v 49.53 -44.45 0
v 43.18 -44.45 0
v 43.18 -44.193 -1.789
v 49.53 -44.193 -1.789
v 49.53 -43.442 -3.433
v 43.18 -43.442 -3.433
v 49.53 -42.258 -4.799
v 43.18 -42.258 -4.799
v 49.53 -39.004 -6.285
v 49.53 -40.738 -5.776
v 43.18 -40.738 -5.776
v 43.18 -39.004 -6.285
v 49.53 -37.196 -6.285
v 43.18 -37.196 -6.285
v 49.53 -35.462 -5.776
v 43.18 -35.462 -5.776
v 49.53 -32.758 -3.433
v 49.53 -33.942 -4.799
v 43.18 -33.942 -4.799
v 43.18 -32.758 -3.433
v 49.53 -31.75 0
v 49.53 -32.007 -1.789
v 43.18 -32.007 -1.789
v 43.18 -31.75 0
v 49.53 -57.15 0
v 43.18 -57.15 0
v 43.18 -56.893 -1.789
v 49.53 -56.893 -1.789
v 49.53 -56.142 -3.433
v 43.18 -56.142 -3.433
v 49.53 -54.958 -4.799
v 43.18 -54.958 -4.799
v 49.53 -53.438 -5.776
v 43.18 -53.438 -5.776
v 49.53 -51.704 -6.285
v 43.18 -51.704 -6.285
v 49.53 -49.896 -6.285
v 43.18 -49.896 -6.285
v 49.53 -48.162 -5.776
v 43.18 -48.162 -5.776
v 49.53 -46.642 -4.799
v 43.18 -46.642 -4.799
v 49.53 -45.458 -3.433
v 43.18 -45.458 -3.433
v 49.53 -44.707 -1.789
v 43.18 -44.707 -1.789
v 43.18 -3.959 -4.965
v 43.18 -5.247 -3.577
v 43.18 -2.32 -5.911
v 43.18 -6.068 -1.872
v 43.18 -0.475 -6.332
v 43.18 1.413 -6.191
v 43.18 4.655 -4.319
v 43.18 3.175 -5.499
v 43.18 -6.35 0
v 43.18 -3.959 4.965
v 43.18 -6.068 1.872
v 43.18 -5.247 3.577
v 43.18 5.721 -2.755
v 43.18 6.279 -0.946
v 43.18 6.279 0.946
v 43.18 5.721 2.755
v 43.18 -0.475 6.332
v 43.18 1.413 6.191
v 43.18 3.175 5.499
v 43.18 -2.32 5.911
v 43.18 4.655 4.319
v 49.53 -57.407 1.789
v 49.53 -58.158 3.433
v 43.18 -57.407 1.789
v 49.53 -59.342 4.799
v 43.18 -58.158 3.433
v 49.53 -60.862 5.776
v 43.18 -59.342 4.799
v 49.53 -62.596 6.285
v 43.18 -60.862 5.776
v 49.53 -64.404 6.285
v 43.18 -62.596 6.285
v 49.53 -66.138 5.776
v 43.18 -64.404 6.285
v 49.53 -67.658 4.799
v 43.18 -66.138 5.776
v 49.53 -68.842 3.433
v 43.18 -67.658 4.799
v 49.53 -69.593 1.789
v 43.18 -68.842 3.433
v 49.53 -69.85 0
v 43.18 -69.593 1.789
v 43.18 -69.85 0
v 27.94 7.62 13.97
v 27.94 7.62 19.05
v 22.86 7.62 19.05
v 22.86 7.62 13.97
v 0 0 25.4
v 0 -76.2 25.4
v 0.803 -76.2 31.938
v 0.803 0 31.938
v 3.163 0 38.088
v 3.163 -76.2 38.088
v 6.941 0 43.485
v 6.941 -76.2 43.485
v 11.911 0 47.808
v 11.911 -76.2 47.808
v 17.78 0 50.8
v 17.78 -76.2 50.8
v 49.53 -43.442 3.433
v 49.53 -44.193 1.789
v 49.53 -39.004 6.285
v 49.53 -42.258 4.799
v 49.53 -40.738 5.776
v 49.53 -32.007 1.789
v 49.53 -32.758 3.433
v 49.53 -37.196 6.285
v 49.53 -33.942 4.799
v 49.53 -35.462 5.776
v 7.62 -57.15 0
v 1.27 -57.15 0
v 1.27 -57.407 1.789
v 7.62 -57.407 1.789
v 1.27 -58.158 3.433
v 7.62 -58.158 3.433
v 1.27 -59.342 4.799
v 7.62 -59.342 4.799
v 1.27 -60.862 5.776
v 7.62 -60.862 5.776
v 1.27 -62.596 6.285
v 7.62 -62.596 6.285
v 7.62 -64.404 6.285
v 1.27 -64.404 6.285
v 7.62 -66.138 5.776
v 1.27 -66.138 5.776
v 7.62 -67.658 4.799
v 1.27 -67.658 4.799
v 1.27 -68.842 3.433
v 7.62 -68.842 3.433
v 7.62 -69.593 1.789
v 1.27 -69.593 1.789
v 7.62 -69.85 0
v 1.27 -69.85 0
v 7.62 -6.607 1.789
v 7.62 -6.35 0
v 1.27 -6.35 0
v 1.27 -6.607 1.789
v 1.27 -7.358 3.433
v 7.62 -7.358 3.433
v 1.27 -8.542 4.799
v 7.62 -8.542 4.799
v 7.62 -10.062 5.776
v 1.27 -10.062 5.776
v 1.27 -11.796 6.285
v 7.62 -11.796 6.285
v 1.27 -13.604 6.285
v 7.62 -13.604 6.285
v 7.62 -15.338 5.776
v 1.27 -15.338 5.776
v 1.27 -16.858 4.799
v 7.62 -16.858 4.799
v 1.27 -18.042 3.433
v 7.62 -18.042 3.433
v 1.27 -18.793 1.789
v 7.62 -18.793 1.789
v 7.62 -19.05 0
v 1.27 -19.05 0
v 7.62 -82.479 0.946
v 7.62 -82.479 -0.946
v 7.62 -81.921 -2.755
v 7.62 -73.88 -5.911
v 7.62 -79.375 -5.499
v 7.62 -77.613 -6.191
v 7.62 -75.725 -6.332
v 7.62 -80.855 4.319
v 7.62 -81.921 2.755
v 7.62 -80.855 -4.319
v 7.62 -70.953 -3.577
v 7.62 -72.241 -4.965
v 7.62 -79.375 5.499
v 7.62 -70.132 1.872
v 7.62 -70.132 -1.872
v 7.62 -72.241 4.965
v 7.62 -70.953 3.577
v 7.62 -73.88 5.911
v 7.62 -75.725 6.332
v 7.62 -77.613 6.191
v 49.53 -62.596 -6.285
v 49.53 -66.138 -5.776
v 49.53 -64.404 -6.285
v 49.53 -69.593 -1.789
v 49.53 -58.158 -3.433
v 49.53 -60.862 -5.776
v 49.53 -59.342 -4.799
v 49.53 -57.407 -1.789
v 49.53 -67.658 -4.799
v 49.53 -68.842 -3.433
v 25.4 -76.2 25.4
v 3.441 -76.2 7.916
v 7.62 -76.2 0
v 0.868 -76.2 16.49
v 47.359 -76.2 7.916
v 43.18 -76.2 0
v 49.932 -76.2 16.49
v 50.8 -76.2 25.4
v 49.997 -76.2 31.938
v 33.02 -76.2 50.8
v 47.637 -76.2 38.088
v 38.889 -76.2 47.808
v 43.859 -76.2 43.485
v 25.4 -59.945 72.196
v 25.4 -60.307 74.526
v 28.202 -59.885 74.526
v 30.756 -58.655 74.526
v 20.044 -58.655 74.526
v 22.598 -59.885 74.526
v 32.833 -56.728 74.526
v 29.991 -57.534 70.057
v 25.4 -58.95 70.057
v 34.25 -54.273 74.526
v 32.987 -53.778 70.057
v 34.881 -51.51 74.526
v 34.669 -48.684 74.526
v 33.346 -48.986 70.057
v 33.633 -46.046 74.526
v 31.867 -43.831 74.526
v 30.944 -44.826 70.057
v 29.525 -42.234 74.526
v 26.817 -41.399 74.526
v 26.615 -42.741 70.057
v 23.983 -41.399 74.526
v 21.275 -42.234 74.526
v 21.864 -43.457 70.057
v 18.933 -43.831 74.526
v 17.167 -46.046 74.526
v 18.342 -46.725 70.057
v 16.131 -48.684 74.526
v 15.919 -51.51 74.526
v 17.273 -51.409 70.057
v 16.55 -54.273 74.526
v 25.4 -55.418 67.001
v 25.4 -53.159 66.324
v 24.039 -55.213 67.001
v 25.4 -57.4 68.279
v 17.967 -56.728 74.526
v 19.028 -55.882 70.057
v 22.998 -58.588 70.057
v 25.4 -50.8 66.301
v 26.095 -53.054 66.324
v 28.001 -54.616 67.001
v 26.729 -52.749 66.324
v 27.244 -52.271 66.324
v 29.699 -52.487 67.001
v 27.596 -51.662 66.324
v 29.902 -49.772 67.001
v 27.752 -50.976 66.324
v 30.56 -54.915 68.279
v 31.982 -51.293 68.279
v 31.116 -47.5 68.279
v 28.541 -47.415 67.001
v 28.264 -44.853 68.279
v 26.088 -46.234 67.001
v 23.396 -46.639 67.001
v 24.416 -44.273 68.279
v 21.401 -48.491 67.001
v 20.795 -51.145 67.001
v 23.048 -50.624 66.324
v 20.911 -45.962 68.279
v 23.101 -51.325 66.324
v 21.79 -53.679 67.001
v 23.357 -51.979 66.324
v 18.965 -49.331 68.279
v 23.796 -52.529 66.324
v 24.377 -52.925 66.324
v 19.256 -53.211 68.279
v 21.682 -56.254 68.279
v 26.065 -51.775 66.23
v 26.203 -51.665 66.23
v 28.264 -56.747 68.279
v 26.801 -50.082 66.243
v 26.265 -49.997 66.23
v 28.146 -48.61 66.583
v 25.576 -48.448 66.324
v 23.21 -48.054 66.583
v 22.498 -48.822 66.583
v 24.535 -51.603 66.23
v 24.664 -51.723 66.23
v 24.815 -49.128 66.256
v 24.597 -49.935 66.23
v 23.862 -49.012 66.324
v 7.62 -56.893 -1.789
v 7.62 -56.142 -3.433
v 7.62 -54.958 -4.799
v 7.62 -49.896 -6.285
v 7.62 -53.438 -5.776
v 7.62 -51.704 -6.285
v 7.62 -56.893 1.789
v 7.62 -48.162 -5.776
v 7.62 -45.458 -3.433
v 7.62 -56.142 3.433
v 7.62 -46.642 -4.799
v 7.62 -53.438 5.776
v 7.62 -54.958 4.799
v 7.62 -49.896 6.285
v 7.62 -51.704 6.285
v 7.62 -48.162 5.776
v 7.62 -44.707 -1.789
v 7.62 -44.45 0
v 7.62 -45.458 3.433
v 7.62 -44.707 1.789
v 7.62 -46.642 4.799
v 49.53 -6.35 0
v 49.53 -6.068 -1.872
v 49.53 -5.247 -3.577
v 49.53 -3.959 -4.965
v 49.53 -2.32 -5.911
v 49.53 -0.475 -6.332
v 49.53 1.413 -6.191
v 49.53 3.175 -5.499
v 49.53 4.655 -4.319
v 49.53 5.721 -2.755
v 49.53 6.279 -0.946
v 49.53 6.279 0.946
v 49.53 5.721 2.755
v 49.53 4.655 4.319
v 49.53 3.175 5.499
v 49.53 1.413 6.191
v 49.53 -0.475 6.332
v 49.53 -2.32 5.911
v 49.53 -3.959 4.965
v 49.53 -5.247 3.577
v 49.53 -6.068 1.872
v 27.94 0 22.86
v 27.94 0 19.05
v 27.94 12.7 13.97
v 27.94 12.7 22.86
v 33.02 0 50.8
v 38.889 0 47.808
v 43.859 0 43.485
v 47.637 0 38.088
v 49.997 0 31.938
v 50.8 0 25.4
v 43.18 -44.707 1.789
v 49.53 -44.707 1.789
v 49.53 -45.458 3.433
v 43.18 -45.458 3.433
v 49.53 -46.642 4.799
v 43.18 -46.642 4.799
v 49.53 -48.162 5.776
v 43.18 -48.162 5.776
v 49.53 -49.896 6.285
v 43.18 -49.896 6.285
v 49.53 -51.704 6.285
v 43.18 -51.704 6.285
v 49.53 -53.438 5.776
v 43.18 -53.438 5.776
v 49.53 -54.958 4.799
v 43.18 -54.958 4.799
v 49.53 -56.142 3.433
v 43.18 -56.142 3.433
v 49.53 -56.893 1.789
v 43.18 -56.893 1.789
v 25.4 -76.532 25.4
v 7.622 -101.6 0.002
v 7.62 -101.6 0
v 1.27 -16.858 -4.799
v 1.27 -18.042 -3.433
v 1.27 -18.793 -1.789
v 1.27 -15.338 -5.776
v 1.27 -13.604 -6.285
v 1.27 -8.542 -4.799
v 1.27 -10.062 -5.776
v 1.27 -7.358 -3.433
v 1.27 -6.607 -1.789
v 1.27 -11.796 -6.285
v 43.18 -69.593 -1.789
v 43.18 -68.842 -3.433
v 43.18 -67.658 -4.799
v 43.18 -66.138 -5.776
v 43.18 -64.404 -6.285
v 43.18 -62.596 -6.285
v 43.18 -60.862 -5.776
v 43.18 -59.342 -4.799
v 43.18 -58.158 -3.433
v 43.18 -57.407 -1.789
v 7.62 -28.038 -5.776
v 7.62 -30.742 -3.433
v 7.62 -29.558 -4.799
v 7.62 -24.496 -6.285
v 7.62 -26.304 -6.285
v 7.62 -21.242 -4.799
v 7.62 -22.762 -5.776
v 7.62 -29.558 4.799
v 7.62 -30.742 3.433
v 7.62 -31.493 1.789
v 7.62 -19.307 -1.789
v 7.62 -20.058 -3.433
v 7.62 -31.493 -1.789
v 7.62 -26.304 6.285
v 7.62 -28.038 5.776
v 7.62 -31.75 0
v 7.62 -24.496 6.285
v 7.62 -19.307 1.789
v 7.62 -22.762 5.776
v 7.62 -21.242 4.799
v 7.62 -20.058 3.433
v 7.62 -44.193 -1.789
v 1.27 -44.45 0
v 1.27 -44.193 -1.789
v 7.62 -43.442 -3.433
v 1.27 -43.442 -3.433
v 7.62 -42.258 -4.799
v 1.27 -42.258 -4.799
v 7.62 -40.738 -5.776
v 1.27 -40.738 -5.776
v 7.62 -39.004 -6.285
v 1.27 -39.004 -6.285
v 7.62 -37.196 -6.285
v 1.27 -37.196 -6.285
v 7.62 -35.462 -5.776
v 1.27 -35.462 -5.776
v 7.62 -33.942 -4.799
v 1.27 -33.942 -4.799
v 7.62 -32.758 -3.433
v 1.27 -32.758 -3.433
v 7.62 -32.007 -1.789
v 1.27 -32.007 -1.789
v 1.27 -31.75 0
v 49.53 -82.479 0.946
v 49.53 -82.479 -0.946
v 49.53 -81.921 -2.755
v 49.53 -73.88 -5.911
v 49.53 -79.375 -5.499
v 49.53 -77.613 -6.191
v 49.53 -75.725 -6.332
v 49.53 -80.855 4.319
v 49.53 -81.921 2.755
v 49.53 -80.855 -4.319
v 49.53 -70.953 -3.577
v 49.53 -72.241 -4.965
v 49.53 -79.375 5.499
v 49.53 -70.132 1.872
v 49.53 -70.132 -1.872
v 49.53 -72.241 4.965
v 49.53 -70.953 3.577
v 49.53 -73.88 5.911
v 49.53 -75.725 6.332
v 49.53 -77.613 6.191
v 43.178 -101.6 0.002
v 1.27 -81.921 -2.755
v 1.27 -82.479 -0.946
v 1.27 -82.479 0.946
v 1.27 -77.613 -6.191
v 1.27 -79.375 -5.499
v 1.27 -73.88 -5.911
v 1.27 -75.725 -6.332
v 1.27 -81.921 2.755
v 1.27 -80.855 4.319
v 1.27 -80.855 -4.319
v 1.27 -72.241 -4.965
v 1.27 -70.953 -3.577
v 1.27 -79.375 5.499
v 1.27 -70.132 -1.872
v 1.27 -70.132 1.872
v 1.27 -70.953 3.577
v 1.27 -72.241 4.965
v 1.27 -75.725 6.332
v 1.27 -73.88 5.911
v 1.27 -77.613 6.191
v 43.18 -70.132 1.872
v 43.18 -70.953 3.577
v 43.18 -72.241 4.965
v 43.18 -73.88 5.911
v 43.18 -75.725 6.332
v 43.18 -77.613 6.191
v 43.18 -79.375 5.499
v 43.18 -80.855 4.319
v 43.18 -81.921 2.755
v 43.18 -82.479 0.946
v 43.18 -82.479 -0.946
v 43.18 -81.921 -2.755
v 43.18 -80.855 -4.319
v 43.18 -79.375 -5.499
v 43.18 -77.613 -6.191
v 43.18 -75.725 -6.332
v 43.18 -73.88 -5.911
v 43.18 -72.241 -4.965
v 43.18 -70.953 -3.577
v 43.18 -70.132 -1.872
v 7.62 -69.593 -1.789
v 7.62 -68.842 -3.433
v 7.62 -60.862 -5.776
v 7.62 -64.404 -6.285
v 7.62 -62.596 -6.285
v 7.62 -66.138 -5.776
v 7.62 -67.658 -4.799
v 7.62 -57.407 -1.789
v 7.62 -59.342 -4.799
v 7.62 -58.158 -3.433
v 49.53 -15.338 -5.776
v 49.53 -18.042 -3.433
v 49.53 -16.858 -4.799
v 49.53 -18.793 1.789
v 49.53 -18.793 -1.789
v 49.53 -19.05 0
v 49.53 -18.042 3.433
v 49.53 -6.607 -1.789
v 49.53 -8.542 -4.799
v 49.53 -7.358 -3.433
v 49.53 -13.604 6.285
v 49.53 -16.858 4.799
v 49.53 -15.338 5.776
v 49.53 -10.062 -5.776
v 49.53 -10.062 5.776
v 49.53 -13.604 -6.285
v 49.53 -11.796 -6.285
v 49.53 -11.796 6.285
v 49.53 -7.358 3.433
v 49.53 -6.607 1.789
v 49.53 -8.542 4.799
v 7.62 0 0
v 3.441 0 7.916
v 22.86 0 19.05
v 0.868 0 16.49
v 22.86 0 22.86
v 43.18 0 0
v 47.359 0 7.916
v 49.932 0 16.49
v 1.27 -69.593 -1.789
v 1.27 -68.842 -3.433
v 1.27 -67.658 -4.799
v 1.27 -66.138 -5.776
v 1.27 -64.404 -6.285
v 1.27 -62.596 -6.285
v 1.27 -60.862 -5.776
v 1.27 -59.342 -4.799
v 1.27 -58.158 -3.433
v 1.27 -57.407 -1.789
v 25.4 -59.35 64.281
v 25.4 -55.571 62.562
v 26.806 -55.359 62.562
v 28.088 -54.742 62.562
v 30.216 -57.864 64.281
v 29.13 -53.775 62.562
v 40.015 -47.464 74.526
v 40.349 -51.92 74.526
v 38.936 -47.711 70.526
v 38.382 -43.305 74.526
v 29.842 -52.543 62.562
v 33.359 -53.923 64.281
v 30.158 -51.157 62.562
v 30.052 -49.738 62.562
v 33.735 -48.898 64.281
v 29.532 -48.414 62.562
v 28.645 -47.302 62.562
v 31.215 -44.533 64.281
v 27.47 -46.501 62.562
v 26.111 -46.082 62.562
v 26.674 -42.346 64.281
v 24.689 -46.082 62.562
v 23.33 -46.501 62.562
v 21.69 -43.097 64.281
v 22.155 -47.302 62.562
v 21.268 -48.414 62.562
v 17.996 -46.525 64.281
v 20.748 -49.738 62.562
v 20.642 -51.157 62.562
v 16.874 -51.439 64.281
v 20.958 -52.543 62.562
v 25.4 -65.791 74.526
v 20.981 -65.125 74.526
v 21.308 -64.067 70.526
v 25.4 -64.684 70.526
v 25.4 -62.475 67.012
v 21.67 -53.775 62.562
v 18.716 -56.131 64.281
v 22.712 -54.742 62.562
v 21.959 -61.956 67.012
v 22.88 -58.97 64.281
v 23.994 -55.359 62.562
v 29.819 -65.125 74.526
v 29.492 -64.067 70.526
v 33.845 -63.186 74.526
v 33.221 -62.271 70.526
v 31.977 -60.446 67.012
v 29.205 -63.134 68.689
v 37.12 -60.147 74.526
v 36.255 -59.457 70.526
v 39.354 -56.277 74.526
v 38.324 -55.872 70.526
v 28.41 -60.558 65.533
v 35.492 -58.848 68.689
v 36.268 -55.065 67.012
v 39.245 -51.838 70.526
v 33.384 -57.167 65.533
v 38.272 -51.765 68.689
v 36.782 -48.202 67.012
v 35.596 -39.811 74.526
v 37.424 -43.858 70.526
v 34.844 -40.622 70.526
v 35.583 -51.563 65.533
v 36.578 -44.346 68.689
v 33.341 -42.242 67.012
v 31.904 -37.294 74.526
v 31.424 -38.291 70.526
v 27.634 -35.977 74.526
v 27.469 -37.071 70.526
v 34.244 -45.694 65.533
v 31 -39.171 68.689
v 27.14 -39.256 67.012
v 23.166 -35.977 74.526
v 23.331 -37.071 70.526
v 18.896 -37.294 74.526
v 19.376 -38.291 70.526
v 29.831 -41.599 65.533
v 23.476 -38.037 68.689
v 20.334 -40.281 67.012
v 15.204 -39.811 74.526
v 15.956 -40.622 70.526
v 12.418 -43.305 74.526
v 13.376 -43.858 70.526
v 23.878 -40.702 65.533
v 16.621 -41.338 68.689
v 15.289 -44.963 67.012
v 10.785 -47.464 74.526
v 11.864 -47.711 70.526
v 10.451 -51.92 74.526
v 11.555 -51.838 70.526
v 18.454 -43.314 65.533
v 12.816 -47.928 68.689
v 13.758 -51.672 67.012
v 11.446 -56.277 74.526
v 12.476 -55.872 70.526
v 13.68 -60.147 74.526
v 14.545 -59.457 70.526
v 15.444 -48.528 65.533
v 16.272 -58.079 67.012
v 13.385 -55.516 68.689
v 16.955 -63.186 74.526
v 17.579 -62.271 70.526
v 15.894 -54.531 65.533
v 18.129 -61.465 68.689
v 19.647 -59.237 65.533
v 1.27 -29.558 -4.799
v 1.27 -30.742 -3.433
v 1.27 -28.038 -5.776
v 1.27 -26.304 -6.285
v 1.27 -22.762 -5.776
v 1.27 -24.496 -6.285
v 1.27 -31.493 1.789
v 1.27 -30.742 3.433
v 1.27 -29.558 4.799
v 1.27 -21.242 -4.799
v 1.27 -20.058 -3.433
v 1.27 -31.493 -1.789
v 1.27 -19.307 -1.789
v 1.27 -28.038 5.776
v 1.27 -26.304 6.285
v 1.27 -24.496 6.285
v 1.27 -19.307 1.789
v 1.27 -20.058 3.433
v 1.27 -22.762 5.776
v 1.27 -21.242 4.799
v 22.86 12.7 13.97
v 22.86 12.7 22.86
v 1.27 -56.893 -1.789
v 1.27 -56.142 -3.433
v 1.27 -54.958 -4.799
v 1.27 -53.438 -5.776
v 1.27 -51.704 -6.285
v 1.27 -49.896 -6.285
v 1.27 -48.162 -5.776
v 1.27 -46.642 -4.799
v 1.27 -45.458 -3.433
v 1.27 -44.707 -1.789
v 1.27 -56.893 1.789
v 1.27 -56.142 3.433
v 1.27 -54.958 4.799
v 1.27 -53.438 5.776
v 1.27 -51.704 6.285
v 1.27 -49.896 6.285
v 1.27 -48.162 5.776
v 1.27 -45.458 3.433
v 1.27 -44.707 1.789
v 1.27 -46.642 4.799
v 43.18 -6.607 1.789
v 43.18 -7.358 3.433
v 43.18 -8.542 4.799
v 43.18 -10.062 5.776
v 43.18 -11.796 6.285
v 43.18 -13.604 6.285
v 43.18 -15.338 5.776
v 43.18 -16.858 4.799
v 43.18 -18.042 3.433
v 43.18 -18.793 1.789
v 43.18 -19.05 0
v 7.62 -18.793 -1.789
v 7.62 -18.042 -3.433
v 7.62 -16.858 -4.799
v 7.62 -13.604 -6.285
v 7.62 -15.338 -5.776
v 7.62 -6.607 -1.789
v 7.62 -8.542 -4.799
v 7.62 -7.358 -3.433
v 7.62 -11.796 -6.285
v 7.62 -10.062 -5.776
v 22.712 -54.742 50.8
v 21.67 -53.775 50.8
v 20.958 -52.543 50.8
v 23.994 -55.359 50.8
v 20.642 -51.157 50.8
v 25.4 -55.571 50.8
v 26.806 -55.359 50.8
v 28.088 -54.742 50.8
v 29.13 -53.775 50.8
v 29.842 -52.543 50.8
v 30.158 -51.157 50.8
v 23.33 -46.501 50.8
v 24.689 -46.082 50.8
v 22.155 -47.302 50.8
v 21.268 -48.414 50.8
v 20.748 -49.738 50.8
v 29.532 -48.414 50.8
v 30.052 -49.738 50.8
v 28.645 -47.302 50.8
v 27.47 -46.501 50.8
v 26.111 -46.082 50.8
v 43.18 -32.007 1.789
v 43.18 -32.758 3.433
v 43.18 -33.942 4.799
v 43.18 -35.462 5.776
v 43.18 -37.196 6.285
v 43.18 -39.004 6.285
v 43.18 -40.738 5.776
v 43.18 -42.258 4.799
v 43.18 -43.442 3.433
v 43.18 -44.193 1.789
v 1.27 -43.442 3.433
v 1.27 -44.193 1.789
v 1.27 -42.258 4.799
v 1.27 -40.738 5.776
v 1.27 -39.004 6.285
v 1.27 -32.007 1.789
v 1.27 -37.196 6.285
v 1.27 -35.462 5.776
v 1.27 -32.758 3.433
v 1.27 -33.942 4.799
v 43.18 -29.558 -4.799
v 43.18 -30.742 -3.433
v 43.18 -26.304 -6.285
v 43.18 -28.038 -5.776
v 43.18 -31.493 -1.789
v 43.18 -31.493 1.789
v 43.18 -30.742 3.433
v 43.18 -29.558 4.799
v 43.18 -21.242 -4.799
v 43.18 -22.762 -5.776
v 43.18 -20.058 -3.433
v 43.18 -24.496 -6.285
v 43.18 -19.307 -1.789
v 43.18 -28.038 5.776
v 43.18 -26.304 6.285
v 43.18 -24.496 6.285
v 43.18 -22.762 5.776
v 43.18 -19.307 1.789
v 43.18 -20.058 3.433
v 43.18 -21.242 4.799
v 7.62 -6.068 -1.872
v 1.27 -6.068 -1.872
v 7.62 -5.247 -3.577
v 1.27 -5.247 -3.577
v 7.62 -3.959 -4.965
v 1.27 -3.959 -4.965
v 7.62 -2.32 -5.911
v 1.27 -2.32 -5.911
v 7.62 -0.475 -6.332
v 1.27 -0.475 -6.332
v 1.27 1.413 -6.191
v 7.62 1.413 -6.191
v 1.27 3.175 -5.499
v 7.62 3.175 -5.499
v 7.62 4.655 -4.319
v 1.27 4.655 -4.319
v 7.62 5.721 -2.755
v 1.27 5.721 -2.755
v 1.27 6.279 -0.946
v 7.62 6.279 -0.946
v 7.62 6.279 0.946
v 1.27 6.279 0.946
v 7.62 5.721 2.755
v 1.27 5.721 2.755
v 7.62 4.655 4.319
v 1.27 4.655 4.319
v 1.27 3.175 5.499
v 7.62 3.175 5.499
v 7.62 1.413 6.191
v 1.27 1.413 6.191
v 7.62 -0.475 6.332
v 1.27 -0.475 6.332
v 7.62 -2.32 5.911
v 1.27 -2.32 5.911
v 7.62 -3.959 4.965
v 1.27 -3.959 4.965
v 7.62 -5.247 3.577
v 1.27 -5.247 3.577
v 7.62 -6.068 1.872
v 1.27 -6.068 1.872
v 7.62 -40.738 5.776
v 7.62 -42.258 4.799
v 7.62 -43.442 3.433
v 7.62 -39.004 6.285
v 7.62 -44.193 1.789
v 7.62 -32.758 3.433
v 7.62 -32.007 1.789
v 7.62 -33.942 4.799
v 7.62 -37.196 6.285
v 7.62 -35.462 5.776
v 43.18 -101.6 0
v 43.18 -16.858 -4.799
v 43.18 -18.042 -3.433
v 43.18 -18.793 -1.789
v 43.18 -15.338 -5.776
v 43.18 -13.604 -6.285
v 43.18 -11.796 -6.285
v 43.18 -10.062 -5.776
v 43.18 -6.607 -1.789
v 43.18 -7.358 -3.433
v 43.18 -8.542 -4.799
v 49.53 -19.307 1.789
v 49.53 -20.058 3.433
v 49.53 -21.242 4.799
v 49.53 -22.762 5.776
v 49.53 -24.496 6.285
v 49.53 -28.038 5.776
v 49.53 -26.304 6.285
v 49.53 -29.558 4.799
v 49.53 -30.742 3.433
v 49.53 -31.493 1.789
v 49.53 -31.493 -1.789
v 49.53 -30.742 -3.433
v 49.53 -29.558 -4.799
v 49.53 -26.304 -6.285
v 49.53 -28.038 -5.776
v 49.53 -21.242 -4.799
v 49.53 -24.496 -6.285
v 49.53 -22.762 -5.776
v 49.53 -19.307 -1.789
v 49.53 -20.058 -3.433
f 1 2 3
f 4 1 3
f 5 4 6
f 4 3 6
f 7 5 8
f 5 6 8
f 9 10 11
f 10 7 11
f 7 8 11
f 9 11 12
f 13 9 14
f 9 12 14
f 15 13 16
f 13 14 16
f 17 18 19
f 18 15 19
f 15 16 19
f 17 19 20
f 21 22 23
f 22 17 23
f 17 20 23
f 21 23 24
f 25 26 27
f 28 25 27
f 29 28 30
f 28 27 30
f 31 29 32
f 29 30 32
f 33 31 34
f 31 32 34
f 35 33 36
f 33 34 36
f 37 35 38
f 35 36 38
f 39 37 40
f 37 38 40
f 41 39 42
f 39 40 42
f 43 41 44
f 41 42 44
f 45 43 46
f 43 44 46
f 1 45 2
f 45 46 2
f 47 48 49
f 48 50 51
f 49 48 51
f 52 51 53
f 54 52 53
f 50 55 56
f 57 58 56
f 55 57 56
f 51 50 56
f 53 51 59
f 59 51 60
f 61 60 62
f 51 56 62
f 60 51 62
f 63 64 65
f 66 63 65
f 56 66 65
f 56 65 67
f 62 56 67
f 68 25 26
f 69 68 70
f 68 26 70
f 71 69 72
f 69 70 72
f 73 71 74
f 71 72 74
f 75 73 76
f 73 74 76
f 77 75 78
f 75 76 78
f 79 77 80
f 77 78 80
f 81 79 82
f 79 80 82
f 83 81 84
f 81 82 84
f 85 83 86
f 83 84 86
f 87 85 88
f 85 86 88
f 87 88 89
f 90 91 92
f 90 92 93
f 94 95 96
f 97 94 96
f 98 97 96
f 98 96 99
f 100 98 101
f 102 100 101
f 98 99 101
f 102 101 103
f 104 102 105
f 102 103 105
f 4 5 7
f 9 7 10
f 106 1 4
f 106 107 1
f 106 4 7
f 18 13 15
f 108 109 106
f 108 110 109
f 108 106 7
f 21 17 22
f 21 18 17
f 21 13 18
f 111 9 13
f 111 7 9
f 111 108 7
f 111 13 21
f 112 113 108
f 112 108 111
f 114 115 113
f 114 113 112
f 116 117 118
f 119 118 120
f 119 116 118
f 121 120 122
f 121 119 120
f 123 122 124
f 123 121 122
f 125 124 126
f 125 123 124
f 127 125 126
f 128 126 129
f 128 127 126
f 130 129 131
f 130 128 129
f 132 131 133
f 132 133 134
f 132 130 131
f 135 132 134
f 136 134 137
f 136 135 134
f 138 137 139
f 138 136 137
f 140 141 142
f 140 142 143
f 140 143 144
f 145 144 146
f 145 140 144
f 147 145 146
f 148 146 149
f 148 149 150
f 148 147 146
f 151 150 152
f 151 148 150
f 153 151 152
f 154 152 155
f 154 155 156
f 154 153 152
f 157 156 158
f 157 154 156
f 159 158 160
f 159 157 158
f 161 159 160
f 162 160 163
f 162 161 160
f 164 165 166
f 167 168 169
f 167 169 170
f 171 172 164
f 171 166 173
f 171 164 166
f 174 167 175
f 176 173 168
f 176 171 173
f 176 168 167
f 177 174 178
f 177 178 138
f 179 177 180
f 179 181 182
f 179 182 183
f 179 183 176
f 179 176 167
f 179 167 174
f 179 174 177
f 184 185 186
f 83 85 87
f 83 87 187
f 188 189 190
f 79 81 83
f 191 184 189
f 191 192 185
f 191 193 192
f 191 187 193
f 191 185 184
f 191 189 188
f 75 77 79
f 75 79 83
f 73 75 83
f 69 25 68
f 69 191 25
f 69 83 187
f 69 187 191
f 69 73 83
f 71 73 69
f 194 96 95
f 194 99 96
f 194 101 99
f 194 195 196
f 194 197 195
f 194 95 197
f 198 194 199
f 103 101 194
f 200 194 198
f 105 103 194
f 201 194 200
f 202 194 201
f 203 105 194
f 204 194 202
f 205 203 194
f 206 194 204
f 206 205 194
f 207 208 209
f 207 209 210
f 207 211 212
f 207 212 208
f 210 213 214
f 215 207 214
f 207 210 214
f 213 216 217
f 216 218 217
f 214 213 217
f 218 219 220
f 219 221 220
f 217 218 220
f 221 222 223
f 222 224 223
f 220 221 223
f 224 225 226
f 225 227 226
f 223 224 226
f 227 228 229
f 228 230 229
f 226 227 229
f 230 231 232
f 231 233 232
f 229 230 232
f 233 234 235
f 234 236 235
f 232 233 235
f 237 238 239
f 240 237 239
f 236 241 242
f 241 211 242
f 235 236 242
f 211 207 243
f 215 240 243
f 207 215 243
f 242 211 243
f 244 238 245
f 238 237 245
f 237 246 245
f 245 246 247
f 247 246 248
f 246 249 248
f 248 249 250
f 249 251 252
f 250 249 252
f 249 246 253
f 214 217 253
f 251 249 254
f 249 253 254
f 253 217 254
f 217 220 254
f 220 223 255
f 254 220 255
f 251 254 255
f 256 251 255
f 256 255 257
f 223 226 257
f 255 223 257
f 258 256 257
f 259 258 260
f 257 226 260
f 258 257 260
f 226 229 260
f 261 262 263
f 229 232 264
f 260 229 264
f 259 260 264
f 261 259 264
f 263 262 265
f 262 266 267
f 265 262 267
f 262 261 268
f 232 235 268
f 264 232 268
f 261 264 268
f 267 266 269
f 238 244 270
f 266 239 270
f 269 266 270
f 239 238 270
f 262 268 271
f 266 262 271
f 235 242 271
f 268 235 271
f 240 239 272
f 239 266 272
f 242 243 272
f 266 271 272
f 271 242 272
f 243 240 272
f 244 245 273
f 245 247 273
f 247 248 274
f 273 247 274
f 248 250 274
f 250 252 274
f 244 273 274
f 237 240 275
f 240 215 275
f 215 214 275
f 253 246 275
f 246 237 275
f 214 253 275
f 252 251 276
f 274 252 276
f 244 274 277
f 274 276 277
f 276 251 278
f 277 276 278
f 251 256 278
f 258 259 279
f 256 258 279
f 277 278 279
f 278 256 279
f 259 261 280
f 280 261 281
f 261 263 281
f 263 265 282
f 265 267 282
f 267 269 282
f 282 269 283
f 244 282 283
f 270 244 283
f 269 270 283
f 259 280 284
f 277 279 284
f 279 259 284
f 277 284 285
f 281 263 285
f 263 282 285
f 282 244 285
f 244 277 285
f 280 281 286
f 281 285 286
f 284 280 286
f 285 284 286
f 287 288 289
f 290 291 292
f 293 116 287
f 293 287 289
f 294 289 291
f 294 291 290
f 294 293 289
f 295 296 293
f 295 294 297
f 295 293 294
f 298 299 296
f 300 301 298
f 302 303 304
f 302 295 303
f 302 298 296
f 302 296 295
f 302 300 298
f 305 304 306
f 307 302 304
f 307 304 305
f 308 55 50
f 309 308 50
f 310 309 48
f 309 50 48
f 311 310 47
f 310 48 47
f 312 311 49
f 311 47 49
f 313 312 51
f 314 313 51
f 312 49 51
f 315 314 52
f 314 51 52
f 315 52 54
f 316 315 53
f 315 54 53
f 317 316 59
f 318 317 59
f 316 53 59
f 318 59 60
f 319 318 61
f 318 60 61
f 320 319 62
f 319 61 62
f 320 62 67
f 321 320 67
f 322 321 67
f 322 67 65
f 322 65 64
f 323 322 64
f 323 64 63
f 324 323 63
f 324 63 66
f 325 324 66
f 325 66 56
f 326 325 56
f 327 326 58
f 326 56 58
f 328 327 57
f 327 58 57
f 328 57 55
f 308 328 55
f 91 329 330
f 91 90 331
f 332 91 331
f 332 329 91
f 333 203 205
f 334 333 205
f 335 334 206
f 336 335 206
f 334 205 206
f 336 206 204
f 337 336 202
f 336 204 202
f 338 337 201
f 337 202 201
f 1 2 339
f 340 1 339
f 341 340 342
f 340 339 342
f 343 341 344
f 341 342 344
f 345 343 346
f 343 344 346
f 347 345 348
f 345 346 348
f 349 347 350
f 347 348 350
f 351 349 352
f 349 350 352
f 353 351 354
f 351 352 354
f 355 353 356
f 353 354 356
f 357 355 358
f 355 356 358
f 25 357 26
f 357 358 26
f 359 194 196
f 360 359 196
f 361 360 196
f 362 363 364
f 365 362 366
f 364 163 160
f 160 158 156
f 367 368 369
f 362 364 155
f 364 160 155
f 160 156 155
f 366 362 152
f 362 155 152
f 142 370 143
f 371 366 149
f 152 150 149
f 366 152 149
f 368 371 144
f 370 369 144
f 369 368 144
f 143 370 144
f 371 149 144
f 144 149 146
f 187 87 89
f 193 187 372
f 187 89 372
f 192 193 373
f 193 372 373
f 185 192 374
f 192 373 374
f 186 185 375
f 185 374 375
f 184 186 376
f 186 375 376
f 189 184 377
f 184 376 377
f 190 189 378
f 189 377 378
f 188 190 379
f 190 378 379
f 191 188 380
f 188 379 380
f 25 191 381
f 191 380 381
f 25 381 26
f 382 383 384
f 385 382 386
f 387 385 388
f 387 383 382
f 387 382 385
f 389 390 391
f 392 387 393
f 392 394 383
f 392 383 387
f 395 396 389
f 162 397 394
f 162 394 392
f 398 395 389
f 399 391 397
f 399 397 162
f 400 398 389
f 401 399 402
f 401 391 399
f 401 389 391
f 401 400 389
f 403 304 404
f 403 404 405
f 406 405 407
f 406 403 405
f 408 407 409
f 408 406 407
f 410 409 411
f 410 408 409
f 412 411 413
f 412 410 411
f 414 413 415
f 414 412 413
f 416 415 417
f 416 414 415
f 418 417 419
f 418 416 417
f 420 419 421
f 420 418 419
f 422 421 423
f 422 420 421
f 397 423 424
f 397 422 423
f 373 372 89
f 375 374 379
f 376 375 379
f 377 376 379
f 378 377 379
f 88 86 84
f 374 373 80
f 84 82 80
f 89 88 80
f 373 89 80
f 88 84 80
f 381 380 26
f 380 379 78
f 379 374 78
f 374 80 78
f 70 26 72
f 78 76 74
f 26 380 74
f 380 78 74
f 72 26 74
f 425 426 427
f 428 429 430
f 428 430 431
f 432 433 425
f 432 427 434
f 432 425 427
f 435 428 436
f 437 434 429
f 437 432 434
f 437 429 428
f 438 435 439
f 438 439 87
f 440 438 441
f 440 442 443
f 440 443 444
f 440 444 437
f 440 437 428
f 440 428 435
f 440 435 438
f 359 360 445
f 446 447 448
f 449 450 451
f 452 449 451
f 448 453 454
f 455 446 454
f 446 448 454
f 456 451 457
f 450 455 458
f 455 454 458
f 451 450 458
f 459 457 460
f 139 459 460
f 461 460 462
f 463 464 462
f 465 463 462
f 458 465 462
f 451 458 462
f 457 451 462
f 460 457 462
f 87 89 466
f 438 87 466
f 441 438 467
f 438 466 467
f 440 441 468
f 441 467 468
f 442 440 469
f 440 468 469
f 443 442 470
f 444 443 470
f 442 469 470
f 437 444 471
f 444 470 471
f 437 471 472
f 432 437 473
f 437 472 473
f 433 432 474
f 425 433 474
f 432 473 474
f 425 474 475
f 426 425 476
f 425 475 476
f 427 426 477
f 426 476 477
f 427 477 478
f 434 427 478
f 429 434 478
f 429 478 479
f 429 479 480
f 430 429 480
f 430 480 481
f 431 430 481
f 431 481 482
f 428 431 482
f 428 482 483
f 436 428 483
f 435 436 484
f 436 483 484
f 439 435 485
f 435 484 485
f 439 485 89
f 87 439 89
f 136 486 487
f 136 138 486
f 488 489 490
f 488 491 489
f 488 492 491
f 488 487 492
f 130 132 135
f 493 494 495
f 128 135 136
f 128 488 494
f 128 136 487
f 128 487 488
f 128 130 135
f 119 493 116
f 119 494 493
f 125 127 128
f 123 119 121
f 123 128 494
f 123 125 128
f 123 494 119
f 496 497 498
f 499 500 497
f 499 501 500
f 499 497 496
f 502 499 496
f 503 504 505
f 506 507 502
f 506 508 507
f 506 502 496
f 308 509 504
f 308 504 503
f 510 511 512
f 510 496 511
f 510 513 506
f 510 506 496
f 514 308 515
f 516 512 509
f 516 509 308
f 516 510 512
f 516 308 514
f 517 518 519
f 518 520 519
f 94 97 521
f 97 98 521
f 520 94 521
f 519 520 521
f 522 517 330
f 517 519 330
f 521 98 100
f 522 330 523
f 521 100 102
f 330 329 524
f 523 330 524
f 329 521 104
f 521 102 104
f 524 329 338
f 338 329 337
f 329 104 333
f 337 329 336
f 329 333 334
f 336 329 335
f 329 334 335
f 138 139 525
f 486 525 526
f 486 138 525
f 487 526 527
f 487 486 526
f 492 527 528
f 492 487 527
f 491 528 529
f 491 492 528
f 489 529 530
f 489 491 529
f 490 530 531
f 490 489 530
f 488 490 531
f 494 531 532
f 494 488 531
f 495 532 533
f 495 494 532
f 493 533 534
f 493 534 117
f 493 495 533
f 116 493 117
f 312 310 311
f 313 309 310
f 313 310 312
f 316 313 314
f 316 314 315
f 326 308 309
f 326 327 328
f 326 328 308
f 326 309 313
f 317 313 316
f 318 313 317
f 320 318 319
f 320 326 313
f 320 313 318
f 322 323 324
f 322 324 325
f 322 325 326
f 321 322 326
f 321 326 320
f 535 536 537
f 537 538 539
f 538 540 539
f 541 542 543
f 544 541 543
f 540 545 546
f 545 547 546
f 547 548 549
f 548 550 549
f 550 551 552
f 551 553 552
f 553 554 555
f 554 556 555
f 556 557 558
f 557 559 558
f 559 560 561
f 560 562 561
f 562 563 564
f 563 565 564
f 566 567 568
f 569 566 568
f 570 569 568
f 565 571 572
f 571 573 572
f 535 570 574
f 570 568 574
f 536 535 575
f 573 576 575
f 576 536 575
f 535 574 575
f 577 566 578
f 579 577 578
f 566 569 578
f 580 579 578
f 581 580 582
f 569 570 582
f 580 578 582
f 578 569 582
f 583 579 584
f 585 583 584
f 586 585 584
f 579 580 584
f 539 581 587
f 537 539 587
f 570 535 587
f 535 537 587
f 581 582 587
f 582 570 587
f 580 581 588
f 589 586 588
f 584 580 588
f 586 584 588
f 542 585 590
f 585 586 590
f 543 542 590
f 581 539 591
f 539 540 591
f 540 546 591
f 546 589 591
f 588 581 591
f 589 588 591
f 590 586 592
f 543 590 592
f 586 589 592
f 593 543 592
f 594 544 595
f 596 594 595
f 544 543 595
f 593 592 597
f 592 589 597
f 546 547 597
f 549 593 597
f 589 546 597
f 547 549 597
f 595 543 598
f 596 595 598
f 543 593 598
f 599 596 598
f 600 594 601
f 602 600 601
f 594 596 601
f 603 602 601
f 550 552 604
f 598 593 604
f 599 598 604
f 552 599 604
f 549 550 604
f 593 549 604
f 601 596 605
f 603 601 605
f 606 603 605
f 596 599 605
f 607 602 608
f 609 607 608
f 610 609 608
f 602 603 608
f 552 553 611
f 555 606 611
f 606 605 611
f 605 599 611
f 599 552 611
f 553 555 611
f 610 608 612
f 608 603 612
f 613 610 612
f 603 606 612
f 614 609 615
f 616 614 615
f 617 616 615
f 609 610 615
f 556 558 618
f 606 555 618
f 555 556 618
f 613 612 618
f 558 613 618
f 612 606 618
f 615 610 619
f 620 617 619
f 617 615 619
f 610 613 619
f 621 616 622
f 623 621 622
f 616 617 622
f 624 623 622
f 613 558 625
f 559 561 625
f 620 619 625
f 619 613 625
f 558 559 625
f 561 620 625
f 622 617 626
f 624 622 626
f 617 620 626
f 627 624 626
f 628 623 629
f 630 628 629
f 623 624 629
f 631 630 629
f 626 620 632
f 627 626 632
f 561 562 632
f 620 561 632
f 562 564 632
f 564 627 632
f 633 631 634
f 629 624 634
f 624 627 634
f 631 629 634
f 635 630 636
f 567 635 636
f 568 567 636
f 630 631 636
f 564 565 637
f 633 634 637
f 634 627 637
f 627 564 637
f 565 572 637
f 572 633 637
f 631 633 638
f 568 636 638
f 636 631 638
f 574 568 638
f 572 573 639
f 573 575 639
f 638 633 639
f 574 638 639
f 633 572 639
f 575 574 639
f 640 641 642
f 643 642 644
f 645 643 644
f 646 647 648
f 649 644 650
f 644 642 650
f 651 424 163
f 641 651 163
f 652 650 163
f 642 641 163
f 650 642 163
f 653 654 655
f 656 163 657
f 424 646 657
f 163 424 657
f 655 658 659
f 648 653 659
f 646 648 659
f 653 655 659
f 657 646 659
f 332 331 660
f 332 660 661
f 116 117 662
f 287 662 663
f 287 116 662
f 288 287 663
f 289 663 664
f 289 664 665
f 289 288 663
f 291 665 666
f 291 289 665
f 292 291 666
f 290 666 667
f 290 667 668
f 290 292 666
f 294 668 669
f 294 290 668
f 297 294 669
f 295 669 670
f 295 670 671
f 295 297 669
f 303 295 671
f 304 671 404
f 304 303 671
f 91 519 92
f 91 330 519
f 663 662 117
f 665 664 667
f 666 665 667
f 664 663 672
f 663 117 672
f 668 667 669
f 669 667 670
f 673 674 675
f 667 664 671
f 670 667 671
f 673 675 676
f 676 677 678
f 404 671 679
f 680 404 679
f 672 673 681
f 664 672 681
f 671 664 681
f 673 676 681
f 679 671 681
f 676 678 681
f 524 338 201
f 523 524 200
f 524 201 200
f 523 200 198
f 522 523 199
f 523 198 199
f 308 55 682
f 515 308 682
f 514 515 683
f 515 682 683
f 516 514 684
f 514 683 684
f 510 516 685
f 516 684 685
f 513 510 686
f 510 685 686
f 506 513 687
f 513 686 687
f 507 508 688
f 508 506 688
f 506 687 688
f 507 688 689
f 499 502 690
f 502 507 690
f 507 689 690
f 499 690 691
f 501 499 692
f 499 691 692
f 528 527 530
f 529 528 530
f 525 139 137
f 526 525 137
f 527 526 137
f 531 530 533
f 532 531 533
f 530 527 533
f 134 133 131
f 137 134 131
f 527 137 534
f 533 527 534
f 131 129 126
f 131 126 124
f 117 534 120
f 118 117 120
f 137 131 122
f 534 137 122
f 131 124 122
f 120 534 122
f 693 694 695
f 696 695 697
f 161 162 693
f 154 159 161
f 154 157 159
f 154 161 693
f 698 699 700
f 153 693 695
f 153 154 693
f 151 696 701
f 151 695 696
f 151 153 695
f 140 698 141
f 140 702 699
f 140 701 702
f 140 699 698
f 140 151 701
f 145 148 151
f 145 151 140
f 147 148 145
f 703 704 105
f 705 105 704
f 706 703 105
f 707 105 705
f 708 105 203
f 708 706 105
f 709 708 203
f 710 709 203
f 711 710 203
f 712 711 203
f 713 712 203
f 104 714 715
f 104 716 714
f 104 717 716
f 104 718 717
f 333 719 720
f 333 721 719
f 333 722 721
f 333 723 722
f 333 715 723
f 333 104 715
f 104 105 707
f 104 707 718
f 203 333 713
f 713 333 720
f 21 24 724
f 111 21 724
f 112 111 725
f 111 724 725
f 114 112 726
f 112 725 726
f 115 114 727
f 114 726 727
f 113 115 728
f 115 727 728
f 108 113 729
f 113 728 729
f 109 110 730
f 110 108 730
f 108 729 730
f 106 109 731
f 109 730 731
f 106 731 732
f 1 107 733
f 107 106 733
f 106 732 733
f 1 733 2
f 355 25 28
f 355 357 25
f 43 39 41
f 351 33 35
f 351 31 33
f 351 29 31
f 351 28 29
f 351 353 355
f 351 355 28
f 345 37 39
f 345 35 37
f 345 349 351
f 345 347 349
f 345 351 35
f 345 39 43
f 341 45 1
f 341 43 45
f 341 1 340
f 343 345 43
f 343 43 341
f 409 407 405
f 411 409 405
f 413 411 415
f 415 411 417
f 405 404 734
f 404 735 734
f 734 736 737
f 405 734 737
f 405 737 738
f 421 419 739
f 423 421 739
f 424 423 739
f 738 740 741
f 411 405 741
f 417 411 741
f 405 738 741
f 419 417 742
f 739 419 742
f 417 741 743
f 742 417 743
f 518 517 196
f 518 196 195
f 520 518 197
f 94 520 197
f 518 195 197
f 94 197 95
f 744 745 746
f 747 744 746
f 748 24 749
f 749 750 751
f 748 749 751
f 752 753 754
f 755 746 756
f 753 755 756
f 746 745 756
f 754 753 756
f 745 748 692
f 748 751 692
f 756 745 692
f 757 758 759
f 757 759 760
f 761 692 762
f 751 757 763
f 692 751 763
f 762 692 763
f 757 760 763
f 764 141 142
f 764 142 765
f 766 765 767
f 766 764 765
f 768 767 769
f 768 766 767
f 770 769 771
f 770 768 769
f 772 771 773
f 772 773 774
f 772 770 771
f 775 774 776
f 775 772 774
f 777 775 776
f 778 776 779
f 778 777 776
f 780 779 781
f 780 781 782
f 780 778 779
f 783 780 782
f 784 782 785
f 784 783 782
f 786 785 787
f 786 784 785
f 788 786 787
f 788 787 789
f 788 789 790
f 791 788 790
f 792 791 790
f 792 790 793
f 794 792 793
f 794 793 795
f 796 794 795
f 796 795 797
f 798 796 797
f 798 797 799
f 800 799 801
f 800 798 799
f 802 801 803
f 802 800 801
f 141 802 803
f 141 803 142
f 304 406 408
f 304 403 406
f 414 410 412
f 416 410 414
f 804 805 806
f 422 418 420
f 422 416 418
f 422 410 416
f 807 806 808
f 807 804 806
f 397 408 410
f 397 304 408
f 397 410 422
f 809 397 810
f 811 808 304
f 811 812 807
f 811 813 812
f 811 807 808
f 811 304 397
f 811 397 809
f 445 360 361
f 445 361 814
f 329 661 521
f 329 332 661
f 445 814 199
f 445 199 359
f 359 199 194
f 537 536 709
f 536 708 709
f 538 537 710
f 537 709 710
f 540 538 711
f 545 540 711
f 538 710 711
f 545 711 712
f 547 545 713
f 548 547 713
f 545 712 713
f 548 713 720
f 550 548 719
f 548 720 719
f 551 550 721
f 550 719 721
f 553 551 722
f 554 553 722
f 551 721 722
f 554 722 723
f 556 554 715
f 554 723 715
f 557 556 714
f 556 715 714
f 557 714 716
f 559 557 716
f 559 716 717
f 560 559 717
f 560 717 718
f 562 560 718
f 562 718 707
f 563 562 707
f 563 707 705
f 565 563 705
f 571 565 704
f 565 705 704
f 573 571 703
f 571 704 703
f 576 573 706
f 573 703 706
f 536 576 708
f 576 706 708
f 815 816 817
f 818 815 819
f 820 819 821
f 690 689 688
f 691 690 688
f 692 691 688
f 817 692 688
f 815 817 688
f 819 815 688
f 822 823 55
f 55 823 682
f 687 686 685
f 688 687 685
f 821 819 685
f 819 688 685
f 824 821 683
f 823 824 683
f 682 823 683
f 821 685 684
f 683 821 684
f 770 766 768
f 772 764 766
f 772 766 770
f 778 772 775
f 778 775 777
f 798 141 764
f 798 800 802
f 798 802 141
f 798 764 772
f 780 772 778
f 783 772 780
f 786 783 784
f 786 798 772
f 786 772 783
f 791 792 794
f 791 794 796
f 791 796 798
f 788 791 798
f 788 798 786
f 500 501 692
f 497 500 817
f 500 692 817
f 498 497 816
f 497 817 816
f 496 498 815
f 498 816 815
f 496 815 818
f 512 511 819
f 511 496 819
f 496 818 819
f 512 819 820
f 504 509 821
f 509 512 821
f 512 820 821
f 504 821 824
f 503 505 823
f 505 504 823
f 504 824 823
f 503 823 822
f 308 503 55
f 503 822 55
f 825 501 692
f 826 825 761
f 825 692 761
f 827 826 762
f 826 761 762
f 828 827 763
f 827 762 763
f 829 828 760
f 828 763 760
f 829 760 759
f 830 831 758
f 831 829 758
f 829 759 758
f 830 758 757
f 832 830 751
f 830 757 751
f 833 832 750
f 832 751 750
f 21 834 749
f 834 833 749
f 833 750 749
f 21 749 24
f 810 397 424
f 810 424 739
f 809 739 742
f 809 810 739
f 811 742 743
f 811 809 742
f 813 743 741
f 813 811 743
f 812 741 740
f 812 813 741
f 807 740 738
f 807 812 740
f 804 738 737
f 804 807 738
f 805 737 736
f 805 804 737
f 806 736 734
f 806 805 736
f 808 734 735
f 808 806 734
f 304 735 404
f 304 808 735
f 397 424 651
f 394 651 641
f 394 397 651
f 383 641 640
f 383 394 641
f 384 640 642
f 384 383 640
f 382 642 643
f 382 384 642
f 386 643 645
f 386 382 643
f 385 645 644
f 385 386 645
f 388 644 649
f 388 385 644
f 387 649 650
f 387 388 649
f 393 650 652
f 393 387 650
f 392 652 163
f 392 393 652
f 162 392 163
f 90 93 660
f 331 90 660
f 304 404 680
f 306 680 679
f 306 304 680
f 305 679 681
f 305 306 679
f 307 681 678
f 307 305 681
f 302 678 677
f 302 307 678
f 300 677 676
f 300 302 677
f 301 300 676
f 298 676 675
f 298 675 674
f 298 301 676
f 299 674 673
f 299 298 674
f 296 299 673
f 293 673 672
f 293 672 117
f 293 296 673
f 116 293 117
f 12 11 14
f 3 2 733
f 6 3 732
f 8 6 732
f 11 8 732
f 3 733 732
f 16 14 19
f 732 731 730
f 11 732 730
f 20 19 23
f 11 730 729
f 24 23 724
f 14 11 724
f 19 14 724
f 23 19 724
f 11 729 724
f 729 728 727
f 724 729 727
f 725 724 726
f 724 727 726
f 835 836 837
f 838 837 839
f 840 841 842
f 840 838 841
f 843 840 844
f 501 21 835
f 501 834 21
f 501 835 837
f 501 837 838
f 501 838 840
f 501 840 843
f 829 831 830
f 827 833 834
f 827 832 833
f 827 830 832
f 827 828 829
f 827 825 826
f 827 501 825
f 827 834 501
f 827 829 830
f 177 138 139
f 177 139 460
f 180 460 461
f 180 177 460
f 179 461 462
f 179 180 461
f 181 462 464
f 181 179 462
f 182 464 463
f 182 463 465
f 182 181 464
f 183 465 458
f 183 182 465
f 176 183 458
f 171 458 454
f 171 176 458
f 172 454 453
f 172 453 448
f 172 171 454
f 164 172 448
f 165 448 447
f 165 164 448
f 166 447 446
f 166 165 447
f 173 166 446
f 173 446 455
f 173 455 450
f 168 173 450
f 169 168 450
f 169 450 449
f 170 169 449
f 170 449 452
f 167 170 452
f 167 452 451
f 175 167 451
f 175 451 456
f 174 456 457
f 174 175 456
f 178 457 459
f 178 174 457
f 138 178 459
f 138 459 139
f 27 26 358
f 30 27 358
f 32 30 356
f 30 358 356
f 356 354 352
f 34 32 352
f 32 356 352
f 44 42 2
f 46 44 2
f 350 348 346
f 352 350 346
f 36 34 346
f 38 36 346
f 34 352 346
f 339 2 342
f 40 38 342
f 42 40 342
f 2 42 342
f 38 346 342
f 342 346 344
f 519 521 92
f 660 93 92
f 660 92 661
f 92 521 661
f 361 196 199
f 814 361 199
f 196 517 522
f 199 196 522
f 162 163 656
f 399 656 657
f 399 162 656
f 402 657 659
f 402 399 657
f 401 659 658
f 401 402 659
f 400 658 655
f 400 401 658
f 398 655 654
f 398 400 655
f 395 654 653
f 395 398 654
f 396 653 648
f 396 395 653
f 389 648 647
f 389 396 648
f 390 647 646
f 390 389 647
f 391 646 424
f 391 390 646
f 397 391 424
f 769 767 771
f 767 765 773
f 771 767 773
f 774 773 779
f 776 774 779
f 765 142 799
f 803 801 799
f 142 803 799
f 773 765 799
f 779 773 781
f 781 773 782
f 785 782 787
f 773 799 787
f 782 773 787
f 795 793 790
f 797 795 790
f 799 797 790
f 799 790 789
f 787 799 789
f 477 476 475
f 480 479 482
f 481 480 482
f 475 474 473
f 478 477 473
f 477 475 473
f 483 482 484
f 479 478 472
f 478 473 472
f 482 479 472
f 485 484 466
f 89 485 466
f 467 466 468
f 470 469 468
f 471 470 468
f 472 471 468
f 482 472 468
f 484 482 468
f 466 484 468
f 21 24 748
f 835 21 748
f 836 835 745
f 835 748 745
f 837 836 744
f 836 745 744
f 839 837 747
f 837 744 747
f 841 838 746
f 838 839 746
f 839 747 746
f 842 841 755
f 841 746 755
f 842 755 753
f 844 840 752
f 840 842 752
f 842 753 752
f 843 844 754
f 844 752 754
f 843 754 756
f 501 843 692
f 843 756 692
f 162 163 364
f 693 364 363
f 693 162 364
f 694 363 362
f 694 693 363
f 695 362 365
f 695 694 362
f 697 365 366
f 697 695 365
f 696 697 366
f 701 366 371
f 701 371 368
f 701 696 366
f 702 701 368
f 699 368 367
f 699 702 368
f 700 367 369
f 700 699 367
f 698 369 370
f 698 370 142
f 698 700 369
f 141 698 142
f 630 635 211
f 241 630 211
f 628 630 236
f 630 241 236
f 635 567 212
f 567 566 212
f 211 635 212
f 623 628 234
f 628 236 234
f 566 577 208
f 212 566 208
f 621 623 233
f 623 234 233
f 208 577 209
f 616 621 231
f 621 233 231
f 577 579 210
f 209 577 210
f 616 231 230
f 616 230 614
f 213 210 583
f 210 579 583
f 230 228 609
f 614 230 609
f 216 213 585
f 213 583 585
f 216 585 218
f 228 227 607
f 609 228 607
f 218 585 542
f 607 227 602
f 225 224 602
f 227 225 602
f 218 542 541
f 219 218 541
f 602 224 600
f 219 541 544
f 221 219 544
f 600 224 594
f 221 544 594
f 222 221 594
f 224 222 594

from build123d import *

# Parameters (mm, degrees)
F0_W      = 50.8
F0_H      = 50.8
F1_DEPTH  = 76.2
F5_DEPTH  = 25.4
F7_DEPTH  = 50.8
F12_DEPTH = 76.2
F14_R     = 6.35
F15_DEPTH = 6.35
F17_R     = 6.35
F18_DEPTH = 6.35
F20_DEPTH = 2.54
F21_DEPTH = 2.54


with BuildPart() as f1:
    # F0 (on Front) → F1 (new body)
    with BuildSketch(Plane.XZ):
        with Locations((25.4, 25.4)):
            Rectangle(F0_W, F0_H)
    extrude(amount=F1_DEPTH)

    # F4 (on offset) → F5 (join)
    with BuildSketch(Plane.XZ.offset(76.2)):
        Polygon((25.4, 25.4), (7.62, 0), (43.18, 0), align=None)
    extrude(amount=F5_DEPTH)

    # F6 (on Right) → F7 (cut)
    with BuildSketch(Plane.YZ):
        Polygon((-101.932339, 25.4), (-101.600028, 0.002174), (-76.532339, 25.4), align=None)
    extrude(amount=F7_DEPTH, mode=Mode.SUBTRACT)

    # F9 (on offset) → F10 (revolve)
    with BuildSketch(Plane.YZ.offset(25.4)):
        with BuildLine():
            Line((-55.571403, 50.8), (-50.8, 50.8))
            Line((-50.8, 50.8), (-50.8, 66.301122))
            ThreePointArc((-50.8, 66.301122), (-57.400454, 68.27911), (-60.307197, 74.526452))
            Line((-60.307197, 74.526452), (-65.790743, 74.526452))
            ThreePointArc((-65.790743, 74.526452), (-62.47485, 67.012212), (-55.571403, 62.562339))
            Line((-55.571403, 62.562339), (-55.571403, 50.8))
        make_face()
    revolve(axis=Axis((25.4, -50.8, 58.550561), (0, 0, 1)))

    # F11 (on face) → F12 (cut)
    with BuildSketch(Plane.XZ.offset(76.2)):
        with BuildLine():
            Line((50.8, 50.8), (33.02, 50.8))
            ThreePointArc((33.02, 50.8), (45.913322, 40.902326), (50.8, 25.4))
            Line((50.8, 25.4), (50.8, 50.8))
        make_face()
        with BuildLine():
            ThreePointArc((0, 25.4), (4.886678, 40.902326), (17.78, 50.8))
            Line((17.78, 50.8), (0, 50.8))
            Line((0, 50.8), (0, 25.4))
        make_face()
        with BuildLine():
            ThreePointArc((7.62, 0), (1.946036, 12.140811), (0, 25.4))
            Line((0, 25.4), (0, 0))
            Line((0, 0), (7.62, 0))
        make_face()
        with BuildLine():
            Line((50.8, 0), (50.8, 25.4))
            ThreePointArc((50.8, 25.4), (48.853964, 12.140811), (43.18, 0))
            Line((43.18, 0), (50.8, 0))
        make_face()
    extrude(amount=-F12_DEPTH, mode=Mode.SUBTRACT)

    # F19 (on offset) → F20 (join)
    with BuildSketch(Plane.YZ.offset(25.4)):
        Polygon((0, 22.86), (0, 19.05), (7.62, 19.05), (7.62, 13.97), (12.7, 13.97), (12.7, 22.86), align=None)
    extrude(amount=F20_DEPTH)

    # F19 (on offset) → F21 (join)
    with BuildSketch(Plane.YZ.offset(25.4)):
        Polygon((0, 22.86), (0, 19.05), (7.62, 19.05), (7.62, 13.97), (12.7, 13.97), (12.7, 22.86), align=None)
    extrude(amount=-F21_DEPTH)


with BuildPart() as f15:
    # F14 (on offset) → F15 (new body)
    with BuildSketch(Plane.YZ.offset(7.62)):
        with BuildLine():
            ThreePointArc((-19.05, 0), (-12.7, -6.35), (-6.35, 0))
            ThreePointArc((-6.35, 0), (-12.7, 6.35), (-19.05, 0))
        make_face()
        with Locations((-76.2, 0)):
            Circle(F14_R)
        with BuildLine():
            ThreePointArc((-69.85, 0), (-63.5, -6.35), (-57.15, 0))
            ThreePointArc((-57.15, 0), (-63.5, 6.35), (-69.85, 0))
        make_face()
        with BuildLine():
            ThreePointArc((-57.15, 0), (-50.8, -6.35), (-44.45, 0))
            ThreePointArc((-44.45, 0), (-50.8, 6.35), (-57.15, 0))
        make_face()
        with BuildLine():
            ThreePointArc((-44.45, 0), (-38.1, -6.35), (-31.75, 0))
            ThreePointArc((-31.75, 0), (-38.1, 6.35), (-44.45, 0))
        make_face()
        with BuildLine():
            ThreePointArc((-31.75, 0), (-25.4, -6.35), (-19.05, 0))
            ThreePointArc((-19.05, 0), (-25.4, 6.35), (-31.75, 0))
        make_face()
        with BuildLine():
            ThreePointArc((6.35, 0), (0, 6.35), (-6.35, 0))
            ThreePointArc((-6.35, 0), (0, -6.35), (6.35, 0))
        make_face()
    extrude(amount=-F15_DEPTH)


with BuildPart() as f18:
    # F17 (on offset) → F18 (new body)
    with BuildSketch(Plane.YZ.offset(43.18)):
        with Locations((-76.2, 0)):
            Circle(F17_R)
        with BuildLine():
            ThreePointArc((6.35, 0), (0, 6.35), (-6.35, 0))
            ThreePointArc((-6.35, 0), (0, -6.35), (6.35, 0))
        make_face()
        with BuildLine():
            ThreePointArc((-6.35, 0), (-12.7, 6.35), (-19.05, 0))
            ThreePointArc((-19.05, 0), (-12.7, -6.35), (-6.35, 0))
        make_face()
        with BuildLine():
            ThreePointArc((-19.05, 0), (-25.4, 6.35), (-31.75, 0))
            ThreePointArc((-31.75, 0), (-25.4, -6.35), (-19.05, 0))
        make_face()
        with BuildLine():
            ThreePointArc((-31.75, 0), (-38.1, 6.35), (-44.45, 0))
            ThreePointArc((-44.45, 0), (-38.1, -6.35), (-31.75, 0))
        make_face()
        with BuildLine():
            ThreePointArc((-44.45, 0), (-50.8, 6.35), (-57.15, 0))
            ThreePointArc((-57.15, 0), (-50.8, -6.35), (-44.45, 0))
        make_face()
        with BuildLine():
            ThreePointArc((-57.15, 0), (-63.5, 6.35), (-69.85, 0))
            ThreePointArc((-69.85, 0), (-63.5, -6.35), (-57.15, 0))
        make_face()
    extrude(amount=F18_DEPTH)


solid = Compound([f1.part, f15.part, f18.part])
